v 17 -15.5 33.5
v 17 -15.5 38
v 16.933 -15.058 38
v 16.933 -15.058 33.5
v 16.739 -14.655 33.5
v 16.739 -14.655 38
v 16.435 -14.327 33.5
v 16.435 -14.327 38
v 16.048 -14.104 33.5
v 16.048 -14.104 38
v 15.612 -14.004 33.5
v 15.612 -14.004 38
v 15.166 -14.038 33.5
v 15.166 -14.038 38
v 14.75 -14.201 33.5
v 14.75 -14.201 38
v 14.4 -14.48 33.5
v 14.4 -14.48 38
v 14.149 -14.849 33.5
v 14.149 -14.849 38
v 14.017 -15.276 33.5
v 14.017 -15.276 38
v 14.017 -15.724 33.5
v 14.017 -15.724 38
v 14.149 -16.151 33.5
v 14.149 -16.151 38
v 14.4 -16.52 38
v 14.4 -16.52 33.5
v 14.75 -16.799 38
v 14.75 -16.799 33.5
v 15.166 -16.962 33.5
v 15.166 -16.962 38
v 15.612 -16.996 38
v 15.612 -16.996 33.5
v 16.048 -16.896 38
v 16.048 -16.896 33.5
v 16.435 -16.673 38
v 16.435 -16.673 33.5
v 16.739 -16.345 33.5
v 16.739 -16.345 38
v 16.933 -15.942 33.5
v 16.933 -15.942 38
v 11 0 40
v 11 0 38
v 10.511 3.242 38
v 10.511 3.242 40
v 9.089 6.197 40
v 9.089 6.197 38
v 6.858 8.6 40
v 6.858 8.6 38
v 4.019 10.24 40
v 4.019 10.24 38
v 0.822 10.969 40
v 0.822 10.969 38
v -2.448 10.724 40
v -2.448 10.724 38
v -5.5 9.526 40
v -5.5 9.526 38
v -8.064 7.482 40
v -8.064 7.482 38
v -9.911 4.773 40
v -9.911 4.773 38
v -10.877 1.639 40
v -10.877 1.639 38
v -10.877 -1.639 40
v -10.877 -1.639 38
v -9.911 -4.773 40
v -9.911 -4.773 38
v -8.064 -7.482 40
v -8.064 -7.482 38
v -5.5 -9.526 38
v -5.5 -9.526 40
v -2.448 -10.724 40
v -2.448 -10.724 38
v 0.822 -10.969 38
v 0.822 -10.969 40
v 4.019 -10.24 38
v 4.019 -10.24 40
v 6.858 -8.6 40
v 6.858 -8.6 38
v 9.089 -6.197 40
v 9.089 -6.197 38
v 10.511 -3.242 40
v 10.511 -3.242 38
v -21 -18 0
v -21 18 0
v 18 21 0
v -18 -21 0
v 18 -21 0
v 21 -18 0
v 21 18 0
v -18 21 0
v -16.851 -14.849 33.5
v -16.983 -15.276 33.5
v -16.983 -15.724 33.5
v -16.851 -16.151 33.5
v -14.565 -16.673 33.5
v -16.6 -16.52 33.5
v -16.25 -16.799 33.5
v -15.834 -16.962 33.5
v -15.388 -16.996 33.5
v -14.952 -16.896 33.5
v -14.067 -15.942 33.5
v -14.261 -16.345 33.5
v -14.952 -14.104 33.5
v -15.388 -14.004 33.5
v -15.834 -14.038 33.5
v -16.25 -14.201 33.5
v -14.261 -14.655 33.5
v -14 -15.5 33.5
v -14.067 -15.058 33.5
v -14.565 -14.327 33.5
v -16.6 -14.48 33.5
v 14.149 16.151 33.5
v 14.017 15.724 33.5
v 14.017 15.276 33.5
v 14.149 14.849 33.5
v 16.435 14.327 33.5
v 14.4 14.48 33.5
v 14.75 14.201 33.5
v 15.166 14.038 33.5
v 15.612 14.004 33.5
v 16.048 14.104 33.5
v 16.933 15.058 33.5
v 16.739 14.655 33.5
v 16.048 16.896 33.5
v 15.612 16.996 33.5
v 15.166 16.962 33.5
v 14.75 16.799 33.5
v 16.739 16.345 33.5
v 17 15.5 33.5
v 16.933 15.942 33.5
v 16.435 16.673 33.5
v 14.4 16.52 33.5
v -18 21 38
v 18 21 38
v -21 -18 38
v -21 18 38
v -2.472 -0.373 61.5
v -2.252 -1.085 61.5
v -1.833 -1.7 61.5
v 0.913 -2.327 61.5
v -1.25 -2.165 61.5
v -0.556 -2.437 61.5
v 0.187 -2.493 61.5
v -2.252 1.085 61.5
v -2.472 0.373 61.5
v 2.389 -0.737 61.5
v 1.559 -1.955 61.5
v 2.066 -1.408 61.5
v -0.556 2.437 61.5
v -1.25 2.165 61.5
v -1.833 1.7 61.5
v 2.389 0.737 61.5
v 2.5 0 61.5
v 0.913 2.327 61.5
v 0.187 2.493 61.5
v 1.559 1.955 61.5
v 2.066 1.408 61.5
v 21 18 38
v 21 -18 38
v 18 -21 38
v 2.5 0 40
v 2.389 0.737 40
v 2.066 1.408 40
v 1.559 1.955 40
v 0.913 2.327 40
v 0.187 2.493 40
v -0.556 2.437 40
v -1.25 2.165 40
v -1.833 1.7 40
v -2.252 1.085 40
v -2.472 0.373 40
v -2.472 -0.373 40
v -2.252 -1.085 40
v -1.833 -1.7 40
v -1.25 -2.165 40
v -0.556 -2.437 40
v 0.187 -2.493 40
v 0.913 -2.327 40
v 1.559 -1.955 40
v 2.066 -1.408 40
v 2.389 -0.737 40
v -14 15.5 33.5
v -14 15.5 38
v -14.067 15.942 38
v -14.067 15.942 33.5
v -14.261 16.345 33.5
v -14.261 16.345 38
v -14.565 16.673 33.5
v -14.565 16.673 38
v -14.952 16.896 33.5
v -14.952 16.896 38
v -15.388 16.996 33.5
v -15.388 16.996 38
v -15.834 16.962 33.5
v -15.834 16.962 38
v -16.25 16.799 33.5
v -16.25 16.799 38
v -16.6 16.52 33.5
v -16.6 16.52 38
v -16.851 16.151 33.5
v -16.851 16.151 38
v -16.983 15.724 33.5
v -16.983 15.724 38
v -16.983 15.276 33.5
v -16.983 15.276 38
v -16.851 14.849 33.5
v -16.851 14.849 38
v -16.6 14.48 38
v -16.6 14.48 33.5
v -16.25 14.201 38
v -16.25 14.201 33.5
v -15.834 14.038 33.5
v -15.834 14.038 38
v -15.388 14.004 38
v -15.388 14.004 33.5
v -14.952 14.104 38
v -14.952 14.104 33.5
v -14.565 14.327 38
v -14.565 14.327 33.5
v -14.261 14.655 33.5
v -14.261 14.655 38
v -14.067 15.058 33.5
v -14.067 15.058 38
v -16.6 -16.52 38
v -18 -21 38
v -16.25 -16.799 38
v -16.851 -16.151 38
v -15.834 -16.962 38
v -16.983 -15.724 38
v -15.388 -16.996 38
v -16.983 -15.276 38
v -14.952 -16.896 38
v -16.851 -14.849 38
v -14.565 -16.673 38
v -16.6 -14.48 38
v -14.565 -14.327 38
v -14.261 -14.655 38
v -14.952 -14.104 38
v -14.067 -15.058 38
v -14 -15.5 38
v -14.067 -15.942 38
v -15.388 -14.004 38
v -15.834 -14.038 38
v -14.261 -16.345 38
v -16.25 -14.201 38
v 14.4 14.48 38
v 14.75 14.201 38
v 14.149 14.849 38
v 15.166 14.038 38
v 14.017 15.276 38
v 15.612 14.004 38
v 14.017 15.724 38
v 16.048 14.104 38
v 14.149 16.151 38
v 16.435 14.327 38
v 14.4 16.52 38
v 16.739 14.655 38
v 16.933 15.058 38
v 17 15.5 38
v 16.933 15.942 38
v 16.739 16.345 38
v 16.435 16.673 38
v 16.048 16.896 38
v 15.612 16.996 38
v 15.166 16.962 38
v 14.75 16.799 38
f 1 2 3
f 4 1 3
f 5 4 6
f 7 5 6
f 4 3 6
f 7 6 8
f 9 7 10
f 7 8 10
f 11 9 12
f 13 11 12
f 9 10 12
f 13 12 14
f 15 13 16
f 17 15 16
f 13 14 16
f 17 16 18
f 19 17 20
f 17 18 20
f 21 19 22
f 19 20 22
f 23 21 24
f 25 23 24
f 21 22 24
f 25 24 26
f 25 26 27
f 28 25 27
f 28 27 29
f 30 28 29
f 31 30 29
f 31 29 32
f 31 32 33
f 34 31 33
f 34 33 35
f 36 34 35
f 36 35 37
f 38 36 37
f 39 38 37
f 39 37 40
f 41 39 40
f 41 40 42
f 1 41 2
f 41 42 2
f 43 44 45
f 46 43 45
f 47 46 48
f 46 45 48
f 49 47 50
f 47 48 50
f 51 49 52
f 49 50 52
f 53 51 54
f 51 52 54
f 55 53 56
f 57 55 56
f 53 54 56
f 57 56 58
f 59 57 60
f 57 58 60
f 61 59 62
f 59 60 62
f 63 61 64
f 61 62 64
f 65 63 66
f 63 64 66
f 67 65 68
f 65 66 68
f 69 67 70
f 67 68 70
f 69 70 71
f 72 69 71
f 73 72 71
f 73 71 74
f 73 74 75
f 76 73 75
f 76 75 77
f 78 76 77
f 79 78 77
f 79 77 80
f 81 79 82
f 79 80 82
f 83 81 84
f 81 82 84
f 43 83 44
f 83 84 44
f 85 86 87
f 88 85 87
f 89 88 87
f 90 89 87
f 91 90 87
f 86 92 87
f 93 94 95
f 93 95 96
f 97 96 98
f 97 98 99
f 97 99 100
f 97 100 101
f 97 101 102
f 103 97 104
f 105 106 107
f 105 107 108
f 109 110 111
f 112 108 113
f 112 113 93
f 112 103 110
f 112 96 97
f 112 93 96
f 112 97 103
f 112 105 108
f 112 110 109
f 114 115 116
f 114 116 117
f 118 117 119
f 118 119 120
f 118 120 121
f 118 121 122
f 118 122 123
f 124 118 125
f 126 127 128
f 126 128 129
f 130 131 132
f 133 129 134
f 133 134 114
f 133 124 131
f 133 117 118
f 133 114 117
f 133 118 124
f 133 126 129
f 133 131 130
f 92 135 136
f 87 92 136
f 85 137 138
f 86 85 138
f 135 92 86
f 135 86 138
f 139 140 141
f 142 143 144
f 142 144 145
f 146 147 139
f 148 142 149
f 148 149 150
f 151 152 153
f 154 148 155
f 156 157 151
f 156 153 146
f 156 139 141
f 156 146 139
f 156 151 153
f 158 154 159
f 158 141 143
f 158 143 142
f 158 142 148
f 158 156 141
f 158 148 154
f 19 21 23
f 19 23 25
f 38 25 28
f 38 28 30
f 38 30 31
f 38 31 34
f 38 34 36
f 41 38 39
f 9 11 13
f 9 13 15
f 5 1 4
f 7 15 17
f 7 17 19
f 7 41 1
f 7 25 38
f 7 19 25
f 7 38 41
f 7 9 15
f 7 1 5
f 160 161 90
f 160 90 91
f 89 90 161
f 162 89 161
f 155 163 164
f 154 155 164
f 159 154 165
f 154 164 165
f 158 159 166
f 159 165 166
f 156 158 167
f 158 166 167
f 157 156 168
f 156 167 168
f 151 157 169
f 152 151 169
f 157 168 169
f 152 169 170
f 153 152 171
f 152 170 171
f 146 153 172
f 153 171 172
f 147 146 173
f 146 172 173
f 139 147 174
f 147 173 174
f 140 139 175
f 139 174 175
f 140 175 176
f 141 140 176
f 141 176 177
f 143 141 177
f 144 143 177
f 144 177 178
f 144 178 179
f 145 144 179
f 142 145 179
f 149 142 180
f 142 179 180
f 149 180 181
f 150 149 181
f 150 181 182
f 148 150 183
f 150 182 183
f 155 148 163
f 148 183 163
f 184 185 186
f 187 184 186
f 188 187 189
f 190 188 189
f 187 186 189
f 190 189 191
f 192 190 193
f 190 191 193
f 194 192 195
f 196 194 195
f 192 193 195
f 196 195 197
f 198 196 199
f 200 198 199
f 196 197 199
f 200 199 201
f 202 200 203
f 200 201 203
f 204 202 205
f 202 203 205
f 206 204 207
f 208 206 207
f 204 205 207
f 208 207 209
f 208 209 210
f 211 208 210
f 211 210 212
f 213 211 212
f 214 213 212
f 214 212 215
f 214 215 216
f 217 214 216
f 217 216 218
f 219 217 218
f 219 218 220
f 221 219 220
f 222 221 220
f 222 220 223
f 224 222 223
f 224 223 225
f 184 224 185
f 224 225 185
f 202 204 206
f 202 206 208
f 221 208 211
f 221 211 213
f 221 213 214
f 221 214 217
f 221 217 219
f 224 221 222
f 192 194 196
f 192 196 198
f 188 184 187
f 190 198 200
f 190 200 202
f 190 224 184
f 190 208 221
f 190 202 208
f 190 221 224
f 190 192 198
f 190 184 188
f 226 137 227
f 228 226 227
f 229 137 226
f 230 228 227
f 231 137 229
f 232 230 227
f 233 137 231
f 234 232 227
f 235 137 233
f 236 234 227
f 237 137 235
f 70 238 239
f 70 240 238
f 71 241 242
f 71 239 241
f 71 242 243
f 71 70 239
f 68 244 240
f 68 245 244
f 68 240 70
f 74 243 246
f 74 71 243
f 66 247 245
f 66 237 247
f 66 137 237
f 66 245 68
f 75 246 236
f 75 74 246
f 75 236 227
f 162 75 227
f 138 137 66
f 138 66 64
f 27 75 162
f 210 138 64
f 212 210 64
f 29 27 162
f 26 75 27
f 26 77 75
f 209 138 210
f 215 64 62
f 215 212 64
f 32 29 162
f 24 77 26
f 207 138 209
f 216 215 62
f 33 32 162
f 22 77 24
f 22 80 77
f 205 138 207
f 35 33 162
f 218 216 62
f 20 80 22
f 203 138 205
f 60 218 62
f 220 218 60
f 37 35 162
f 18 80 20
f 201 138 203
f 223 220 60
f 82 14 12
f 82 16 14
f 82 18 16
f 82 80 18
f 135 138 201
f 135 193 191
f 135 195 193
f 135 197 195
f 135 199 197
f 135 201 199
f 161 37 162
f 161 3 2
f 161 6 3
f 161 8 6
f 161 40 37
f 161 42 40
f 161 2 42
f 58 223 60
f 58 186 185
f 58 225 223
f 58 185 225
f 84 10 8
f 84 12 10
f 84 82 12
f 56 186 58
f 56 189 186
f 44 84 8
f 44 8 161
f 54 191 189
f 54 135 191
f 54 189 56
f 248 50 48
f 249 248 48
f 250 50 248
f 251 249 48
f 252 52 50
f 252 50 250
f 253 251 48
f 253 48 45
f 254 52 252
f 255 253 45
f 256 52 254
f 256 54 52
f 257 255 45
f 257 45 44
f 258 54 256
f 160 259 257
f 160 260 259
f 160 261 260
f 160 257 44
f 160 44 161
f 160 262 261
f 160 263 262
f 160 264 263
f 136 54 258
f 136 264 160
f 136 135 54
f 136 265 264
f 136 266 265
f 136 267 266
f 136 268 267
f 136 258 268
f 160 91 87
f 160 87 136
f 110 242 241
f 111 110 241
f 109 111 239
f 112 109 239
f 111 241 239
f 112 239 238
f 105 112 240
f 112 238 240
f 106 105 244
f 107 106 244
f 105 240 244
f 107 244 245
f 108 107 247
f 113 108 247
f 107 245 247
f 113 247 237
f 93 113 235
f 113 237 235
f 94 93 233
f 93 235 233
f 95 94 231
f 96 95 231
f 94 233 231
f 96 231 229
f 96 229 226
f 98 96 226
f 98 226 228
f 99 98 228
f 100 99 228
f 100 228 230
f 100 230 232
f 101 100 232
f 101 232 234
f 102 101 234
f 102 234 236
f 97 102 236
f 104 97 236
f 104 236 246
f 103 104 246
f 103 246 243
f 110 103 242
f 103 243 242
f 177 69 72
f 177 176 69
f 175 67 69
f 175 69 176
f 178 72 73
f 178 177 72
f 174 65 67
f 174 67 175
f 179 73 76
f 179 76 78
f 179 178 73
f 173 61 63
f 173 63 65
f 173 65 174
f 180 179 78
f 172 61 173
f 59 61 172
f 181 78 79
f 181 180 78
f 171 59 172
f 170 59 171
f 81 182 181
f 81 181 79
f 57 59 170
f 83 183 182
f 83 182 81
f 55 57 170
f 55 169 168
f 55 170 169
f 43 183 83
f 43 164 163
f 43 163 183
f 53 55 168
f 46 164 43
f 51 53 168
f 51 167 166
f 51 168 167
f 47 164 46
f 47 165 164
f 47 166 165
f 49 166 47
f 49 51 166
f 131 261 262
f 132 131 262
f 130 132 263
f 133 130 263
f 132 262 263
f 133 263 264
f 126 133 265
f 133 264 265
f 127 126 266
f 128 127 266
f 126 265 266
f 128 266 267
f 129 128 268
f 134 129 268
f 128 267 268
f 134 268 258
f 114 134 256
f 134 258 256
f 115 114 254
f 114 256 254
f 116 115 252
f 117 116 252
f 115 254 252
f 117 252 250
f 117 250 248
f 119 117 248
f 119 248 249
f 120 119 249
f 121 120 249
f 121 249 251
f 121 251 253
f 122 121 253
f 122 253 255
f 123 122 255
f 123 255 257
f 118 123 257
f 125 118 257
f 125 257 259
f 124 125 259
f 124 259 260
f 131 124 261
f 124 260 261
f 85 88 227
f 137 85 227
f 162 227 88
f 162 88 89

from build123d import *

# Parameters (mm, degrees)
SKETCH1_W           = 42
SKETCH1_H           = 42
BOSS_EXTRUDE1_DEPTH = 38
SKETCH2_R           = 11
BOSS_EXTRUDE2_DEPTH = 2
SKETCH3_R           = 2.5
BOSS_EXTRUDE3_DEPTH = 21.5
SKETCH4_R           = 1.5
CUT_EXTRUDE1_DEPTH  = 4.5
CHAMFER1_SIZE       = 3


with BuildPart() as part:
    # Sketch1 → Boss-Extrude1 (new body)
    with BuildSketch(Plane.XY):
        Rectangle(SKETCH1_W, SKETCH1_H)
    extrude(amount=BOSS_EXTRUDE1_DEPTH)

    # Sketch2 → Boss-Extrude2 (add)
    with BuildSketch(Plane.XY.offset(38)):
        Circle(SKETCH2_R)
    extrude(amount=BOSS_EXTRUDE2_DEPTH)

    # Sketch3 → Boss-Extrude3 (add)
    with BuildSketch(Plane.XY.offset(40)):
        Circle(SKETCH3_R)
    extrude(amount=BOSS_EXTRUDE3_DEPTH)

    # Sketch4 → Cut-Extrude1 (cut)
    with BuildSketch(Plane.XY.offset(38)):
        with Locations((15.5, 15.5)):
            Circle(SKETCH4_R)
        with Locations((15.5, -15.5)):
            Circle(SKETCH4_R)
        with Locations((-15.5, -15.5)):
            Circle(SKETCH4_R)
        with Locations((-15.5, 15.5)):
            Circle(SKETCH4_R)
    extrude(amount=-CUT_EXTRUDE1_DEPTH, mode=Mode.SUBTRACT)

    # Chamfer1
    chamfer1_edges = [part.edges().sort_by_distance(p)[0] for p in [
        (21, -21, 19),
        (-21, -21, 19),
        (-21, 21, 19),
        (21, 21, 19),
    ]]
    chamfer(chamfer1_edges, length=CHAMFER1_SIZE)


solid = part.part
